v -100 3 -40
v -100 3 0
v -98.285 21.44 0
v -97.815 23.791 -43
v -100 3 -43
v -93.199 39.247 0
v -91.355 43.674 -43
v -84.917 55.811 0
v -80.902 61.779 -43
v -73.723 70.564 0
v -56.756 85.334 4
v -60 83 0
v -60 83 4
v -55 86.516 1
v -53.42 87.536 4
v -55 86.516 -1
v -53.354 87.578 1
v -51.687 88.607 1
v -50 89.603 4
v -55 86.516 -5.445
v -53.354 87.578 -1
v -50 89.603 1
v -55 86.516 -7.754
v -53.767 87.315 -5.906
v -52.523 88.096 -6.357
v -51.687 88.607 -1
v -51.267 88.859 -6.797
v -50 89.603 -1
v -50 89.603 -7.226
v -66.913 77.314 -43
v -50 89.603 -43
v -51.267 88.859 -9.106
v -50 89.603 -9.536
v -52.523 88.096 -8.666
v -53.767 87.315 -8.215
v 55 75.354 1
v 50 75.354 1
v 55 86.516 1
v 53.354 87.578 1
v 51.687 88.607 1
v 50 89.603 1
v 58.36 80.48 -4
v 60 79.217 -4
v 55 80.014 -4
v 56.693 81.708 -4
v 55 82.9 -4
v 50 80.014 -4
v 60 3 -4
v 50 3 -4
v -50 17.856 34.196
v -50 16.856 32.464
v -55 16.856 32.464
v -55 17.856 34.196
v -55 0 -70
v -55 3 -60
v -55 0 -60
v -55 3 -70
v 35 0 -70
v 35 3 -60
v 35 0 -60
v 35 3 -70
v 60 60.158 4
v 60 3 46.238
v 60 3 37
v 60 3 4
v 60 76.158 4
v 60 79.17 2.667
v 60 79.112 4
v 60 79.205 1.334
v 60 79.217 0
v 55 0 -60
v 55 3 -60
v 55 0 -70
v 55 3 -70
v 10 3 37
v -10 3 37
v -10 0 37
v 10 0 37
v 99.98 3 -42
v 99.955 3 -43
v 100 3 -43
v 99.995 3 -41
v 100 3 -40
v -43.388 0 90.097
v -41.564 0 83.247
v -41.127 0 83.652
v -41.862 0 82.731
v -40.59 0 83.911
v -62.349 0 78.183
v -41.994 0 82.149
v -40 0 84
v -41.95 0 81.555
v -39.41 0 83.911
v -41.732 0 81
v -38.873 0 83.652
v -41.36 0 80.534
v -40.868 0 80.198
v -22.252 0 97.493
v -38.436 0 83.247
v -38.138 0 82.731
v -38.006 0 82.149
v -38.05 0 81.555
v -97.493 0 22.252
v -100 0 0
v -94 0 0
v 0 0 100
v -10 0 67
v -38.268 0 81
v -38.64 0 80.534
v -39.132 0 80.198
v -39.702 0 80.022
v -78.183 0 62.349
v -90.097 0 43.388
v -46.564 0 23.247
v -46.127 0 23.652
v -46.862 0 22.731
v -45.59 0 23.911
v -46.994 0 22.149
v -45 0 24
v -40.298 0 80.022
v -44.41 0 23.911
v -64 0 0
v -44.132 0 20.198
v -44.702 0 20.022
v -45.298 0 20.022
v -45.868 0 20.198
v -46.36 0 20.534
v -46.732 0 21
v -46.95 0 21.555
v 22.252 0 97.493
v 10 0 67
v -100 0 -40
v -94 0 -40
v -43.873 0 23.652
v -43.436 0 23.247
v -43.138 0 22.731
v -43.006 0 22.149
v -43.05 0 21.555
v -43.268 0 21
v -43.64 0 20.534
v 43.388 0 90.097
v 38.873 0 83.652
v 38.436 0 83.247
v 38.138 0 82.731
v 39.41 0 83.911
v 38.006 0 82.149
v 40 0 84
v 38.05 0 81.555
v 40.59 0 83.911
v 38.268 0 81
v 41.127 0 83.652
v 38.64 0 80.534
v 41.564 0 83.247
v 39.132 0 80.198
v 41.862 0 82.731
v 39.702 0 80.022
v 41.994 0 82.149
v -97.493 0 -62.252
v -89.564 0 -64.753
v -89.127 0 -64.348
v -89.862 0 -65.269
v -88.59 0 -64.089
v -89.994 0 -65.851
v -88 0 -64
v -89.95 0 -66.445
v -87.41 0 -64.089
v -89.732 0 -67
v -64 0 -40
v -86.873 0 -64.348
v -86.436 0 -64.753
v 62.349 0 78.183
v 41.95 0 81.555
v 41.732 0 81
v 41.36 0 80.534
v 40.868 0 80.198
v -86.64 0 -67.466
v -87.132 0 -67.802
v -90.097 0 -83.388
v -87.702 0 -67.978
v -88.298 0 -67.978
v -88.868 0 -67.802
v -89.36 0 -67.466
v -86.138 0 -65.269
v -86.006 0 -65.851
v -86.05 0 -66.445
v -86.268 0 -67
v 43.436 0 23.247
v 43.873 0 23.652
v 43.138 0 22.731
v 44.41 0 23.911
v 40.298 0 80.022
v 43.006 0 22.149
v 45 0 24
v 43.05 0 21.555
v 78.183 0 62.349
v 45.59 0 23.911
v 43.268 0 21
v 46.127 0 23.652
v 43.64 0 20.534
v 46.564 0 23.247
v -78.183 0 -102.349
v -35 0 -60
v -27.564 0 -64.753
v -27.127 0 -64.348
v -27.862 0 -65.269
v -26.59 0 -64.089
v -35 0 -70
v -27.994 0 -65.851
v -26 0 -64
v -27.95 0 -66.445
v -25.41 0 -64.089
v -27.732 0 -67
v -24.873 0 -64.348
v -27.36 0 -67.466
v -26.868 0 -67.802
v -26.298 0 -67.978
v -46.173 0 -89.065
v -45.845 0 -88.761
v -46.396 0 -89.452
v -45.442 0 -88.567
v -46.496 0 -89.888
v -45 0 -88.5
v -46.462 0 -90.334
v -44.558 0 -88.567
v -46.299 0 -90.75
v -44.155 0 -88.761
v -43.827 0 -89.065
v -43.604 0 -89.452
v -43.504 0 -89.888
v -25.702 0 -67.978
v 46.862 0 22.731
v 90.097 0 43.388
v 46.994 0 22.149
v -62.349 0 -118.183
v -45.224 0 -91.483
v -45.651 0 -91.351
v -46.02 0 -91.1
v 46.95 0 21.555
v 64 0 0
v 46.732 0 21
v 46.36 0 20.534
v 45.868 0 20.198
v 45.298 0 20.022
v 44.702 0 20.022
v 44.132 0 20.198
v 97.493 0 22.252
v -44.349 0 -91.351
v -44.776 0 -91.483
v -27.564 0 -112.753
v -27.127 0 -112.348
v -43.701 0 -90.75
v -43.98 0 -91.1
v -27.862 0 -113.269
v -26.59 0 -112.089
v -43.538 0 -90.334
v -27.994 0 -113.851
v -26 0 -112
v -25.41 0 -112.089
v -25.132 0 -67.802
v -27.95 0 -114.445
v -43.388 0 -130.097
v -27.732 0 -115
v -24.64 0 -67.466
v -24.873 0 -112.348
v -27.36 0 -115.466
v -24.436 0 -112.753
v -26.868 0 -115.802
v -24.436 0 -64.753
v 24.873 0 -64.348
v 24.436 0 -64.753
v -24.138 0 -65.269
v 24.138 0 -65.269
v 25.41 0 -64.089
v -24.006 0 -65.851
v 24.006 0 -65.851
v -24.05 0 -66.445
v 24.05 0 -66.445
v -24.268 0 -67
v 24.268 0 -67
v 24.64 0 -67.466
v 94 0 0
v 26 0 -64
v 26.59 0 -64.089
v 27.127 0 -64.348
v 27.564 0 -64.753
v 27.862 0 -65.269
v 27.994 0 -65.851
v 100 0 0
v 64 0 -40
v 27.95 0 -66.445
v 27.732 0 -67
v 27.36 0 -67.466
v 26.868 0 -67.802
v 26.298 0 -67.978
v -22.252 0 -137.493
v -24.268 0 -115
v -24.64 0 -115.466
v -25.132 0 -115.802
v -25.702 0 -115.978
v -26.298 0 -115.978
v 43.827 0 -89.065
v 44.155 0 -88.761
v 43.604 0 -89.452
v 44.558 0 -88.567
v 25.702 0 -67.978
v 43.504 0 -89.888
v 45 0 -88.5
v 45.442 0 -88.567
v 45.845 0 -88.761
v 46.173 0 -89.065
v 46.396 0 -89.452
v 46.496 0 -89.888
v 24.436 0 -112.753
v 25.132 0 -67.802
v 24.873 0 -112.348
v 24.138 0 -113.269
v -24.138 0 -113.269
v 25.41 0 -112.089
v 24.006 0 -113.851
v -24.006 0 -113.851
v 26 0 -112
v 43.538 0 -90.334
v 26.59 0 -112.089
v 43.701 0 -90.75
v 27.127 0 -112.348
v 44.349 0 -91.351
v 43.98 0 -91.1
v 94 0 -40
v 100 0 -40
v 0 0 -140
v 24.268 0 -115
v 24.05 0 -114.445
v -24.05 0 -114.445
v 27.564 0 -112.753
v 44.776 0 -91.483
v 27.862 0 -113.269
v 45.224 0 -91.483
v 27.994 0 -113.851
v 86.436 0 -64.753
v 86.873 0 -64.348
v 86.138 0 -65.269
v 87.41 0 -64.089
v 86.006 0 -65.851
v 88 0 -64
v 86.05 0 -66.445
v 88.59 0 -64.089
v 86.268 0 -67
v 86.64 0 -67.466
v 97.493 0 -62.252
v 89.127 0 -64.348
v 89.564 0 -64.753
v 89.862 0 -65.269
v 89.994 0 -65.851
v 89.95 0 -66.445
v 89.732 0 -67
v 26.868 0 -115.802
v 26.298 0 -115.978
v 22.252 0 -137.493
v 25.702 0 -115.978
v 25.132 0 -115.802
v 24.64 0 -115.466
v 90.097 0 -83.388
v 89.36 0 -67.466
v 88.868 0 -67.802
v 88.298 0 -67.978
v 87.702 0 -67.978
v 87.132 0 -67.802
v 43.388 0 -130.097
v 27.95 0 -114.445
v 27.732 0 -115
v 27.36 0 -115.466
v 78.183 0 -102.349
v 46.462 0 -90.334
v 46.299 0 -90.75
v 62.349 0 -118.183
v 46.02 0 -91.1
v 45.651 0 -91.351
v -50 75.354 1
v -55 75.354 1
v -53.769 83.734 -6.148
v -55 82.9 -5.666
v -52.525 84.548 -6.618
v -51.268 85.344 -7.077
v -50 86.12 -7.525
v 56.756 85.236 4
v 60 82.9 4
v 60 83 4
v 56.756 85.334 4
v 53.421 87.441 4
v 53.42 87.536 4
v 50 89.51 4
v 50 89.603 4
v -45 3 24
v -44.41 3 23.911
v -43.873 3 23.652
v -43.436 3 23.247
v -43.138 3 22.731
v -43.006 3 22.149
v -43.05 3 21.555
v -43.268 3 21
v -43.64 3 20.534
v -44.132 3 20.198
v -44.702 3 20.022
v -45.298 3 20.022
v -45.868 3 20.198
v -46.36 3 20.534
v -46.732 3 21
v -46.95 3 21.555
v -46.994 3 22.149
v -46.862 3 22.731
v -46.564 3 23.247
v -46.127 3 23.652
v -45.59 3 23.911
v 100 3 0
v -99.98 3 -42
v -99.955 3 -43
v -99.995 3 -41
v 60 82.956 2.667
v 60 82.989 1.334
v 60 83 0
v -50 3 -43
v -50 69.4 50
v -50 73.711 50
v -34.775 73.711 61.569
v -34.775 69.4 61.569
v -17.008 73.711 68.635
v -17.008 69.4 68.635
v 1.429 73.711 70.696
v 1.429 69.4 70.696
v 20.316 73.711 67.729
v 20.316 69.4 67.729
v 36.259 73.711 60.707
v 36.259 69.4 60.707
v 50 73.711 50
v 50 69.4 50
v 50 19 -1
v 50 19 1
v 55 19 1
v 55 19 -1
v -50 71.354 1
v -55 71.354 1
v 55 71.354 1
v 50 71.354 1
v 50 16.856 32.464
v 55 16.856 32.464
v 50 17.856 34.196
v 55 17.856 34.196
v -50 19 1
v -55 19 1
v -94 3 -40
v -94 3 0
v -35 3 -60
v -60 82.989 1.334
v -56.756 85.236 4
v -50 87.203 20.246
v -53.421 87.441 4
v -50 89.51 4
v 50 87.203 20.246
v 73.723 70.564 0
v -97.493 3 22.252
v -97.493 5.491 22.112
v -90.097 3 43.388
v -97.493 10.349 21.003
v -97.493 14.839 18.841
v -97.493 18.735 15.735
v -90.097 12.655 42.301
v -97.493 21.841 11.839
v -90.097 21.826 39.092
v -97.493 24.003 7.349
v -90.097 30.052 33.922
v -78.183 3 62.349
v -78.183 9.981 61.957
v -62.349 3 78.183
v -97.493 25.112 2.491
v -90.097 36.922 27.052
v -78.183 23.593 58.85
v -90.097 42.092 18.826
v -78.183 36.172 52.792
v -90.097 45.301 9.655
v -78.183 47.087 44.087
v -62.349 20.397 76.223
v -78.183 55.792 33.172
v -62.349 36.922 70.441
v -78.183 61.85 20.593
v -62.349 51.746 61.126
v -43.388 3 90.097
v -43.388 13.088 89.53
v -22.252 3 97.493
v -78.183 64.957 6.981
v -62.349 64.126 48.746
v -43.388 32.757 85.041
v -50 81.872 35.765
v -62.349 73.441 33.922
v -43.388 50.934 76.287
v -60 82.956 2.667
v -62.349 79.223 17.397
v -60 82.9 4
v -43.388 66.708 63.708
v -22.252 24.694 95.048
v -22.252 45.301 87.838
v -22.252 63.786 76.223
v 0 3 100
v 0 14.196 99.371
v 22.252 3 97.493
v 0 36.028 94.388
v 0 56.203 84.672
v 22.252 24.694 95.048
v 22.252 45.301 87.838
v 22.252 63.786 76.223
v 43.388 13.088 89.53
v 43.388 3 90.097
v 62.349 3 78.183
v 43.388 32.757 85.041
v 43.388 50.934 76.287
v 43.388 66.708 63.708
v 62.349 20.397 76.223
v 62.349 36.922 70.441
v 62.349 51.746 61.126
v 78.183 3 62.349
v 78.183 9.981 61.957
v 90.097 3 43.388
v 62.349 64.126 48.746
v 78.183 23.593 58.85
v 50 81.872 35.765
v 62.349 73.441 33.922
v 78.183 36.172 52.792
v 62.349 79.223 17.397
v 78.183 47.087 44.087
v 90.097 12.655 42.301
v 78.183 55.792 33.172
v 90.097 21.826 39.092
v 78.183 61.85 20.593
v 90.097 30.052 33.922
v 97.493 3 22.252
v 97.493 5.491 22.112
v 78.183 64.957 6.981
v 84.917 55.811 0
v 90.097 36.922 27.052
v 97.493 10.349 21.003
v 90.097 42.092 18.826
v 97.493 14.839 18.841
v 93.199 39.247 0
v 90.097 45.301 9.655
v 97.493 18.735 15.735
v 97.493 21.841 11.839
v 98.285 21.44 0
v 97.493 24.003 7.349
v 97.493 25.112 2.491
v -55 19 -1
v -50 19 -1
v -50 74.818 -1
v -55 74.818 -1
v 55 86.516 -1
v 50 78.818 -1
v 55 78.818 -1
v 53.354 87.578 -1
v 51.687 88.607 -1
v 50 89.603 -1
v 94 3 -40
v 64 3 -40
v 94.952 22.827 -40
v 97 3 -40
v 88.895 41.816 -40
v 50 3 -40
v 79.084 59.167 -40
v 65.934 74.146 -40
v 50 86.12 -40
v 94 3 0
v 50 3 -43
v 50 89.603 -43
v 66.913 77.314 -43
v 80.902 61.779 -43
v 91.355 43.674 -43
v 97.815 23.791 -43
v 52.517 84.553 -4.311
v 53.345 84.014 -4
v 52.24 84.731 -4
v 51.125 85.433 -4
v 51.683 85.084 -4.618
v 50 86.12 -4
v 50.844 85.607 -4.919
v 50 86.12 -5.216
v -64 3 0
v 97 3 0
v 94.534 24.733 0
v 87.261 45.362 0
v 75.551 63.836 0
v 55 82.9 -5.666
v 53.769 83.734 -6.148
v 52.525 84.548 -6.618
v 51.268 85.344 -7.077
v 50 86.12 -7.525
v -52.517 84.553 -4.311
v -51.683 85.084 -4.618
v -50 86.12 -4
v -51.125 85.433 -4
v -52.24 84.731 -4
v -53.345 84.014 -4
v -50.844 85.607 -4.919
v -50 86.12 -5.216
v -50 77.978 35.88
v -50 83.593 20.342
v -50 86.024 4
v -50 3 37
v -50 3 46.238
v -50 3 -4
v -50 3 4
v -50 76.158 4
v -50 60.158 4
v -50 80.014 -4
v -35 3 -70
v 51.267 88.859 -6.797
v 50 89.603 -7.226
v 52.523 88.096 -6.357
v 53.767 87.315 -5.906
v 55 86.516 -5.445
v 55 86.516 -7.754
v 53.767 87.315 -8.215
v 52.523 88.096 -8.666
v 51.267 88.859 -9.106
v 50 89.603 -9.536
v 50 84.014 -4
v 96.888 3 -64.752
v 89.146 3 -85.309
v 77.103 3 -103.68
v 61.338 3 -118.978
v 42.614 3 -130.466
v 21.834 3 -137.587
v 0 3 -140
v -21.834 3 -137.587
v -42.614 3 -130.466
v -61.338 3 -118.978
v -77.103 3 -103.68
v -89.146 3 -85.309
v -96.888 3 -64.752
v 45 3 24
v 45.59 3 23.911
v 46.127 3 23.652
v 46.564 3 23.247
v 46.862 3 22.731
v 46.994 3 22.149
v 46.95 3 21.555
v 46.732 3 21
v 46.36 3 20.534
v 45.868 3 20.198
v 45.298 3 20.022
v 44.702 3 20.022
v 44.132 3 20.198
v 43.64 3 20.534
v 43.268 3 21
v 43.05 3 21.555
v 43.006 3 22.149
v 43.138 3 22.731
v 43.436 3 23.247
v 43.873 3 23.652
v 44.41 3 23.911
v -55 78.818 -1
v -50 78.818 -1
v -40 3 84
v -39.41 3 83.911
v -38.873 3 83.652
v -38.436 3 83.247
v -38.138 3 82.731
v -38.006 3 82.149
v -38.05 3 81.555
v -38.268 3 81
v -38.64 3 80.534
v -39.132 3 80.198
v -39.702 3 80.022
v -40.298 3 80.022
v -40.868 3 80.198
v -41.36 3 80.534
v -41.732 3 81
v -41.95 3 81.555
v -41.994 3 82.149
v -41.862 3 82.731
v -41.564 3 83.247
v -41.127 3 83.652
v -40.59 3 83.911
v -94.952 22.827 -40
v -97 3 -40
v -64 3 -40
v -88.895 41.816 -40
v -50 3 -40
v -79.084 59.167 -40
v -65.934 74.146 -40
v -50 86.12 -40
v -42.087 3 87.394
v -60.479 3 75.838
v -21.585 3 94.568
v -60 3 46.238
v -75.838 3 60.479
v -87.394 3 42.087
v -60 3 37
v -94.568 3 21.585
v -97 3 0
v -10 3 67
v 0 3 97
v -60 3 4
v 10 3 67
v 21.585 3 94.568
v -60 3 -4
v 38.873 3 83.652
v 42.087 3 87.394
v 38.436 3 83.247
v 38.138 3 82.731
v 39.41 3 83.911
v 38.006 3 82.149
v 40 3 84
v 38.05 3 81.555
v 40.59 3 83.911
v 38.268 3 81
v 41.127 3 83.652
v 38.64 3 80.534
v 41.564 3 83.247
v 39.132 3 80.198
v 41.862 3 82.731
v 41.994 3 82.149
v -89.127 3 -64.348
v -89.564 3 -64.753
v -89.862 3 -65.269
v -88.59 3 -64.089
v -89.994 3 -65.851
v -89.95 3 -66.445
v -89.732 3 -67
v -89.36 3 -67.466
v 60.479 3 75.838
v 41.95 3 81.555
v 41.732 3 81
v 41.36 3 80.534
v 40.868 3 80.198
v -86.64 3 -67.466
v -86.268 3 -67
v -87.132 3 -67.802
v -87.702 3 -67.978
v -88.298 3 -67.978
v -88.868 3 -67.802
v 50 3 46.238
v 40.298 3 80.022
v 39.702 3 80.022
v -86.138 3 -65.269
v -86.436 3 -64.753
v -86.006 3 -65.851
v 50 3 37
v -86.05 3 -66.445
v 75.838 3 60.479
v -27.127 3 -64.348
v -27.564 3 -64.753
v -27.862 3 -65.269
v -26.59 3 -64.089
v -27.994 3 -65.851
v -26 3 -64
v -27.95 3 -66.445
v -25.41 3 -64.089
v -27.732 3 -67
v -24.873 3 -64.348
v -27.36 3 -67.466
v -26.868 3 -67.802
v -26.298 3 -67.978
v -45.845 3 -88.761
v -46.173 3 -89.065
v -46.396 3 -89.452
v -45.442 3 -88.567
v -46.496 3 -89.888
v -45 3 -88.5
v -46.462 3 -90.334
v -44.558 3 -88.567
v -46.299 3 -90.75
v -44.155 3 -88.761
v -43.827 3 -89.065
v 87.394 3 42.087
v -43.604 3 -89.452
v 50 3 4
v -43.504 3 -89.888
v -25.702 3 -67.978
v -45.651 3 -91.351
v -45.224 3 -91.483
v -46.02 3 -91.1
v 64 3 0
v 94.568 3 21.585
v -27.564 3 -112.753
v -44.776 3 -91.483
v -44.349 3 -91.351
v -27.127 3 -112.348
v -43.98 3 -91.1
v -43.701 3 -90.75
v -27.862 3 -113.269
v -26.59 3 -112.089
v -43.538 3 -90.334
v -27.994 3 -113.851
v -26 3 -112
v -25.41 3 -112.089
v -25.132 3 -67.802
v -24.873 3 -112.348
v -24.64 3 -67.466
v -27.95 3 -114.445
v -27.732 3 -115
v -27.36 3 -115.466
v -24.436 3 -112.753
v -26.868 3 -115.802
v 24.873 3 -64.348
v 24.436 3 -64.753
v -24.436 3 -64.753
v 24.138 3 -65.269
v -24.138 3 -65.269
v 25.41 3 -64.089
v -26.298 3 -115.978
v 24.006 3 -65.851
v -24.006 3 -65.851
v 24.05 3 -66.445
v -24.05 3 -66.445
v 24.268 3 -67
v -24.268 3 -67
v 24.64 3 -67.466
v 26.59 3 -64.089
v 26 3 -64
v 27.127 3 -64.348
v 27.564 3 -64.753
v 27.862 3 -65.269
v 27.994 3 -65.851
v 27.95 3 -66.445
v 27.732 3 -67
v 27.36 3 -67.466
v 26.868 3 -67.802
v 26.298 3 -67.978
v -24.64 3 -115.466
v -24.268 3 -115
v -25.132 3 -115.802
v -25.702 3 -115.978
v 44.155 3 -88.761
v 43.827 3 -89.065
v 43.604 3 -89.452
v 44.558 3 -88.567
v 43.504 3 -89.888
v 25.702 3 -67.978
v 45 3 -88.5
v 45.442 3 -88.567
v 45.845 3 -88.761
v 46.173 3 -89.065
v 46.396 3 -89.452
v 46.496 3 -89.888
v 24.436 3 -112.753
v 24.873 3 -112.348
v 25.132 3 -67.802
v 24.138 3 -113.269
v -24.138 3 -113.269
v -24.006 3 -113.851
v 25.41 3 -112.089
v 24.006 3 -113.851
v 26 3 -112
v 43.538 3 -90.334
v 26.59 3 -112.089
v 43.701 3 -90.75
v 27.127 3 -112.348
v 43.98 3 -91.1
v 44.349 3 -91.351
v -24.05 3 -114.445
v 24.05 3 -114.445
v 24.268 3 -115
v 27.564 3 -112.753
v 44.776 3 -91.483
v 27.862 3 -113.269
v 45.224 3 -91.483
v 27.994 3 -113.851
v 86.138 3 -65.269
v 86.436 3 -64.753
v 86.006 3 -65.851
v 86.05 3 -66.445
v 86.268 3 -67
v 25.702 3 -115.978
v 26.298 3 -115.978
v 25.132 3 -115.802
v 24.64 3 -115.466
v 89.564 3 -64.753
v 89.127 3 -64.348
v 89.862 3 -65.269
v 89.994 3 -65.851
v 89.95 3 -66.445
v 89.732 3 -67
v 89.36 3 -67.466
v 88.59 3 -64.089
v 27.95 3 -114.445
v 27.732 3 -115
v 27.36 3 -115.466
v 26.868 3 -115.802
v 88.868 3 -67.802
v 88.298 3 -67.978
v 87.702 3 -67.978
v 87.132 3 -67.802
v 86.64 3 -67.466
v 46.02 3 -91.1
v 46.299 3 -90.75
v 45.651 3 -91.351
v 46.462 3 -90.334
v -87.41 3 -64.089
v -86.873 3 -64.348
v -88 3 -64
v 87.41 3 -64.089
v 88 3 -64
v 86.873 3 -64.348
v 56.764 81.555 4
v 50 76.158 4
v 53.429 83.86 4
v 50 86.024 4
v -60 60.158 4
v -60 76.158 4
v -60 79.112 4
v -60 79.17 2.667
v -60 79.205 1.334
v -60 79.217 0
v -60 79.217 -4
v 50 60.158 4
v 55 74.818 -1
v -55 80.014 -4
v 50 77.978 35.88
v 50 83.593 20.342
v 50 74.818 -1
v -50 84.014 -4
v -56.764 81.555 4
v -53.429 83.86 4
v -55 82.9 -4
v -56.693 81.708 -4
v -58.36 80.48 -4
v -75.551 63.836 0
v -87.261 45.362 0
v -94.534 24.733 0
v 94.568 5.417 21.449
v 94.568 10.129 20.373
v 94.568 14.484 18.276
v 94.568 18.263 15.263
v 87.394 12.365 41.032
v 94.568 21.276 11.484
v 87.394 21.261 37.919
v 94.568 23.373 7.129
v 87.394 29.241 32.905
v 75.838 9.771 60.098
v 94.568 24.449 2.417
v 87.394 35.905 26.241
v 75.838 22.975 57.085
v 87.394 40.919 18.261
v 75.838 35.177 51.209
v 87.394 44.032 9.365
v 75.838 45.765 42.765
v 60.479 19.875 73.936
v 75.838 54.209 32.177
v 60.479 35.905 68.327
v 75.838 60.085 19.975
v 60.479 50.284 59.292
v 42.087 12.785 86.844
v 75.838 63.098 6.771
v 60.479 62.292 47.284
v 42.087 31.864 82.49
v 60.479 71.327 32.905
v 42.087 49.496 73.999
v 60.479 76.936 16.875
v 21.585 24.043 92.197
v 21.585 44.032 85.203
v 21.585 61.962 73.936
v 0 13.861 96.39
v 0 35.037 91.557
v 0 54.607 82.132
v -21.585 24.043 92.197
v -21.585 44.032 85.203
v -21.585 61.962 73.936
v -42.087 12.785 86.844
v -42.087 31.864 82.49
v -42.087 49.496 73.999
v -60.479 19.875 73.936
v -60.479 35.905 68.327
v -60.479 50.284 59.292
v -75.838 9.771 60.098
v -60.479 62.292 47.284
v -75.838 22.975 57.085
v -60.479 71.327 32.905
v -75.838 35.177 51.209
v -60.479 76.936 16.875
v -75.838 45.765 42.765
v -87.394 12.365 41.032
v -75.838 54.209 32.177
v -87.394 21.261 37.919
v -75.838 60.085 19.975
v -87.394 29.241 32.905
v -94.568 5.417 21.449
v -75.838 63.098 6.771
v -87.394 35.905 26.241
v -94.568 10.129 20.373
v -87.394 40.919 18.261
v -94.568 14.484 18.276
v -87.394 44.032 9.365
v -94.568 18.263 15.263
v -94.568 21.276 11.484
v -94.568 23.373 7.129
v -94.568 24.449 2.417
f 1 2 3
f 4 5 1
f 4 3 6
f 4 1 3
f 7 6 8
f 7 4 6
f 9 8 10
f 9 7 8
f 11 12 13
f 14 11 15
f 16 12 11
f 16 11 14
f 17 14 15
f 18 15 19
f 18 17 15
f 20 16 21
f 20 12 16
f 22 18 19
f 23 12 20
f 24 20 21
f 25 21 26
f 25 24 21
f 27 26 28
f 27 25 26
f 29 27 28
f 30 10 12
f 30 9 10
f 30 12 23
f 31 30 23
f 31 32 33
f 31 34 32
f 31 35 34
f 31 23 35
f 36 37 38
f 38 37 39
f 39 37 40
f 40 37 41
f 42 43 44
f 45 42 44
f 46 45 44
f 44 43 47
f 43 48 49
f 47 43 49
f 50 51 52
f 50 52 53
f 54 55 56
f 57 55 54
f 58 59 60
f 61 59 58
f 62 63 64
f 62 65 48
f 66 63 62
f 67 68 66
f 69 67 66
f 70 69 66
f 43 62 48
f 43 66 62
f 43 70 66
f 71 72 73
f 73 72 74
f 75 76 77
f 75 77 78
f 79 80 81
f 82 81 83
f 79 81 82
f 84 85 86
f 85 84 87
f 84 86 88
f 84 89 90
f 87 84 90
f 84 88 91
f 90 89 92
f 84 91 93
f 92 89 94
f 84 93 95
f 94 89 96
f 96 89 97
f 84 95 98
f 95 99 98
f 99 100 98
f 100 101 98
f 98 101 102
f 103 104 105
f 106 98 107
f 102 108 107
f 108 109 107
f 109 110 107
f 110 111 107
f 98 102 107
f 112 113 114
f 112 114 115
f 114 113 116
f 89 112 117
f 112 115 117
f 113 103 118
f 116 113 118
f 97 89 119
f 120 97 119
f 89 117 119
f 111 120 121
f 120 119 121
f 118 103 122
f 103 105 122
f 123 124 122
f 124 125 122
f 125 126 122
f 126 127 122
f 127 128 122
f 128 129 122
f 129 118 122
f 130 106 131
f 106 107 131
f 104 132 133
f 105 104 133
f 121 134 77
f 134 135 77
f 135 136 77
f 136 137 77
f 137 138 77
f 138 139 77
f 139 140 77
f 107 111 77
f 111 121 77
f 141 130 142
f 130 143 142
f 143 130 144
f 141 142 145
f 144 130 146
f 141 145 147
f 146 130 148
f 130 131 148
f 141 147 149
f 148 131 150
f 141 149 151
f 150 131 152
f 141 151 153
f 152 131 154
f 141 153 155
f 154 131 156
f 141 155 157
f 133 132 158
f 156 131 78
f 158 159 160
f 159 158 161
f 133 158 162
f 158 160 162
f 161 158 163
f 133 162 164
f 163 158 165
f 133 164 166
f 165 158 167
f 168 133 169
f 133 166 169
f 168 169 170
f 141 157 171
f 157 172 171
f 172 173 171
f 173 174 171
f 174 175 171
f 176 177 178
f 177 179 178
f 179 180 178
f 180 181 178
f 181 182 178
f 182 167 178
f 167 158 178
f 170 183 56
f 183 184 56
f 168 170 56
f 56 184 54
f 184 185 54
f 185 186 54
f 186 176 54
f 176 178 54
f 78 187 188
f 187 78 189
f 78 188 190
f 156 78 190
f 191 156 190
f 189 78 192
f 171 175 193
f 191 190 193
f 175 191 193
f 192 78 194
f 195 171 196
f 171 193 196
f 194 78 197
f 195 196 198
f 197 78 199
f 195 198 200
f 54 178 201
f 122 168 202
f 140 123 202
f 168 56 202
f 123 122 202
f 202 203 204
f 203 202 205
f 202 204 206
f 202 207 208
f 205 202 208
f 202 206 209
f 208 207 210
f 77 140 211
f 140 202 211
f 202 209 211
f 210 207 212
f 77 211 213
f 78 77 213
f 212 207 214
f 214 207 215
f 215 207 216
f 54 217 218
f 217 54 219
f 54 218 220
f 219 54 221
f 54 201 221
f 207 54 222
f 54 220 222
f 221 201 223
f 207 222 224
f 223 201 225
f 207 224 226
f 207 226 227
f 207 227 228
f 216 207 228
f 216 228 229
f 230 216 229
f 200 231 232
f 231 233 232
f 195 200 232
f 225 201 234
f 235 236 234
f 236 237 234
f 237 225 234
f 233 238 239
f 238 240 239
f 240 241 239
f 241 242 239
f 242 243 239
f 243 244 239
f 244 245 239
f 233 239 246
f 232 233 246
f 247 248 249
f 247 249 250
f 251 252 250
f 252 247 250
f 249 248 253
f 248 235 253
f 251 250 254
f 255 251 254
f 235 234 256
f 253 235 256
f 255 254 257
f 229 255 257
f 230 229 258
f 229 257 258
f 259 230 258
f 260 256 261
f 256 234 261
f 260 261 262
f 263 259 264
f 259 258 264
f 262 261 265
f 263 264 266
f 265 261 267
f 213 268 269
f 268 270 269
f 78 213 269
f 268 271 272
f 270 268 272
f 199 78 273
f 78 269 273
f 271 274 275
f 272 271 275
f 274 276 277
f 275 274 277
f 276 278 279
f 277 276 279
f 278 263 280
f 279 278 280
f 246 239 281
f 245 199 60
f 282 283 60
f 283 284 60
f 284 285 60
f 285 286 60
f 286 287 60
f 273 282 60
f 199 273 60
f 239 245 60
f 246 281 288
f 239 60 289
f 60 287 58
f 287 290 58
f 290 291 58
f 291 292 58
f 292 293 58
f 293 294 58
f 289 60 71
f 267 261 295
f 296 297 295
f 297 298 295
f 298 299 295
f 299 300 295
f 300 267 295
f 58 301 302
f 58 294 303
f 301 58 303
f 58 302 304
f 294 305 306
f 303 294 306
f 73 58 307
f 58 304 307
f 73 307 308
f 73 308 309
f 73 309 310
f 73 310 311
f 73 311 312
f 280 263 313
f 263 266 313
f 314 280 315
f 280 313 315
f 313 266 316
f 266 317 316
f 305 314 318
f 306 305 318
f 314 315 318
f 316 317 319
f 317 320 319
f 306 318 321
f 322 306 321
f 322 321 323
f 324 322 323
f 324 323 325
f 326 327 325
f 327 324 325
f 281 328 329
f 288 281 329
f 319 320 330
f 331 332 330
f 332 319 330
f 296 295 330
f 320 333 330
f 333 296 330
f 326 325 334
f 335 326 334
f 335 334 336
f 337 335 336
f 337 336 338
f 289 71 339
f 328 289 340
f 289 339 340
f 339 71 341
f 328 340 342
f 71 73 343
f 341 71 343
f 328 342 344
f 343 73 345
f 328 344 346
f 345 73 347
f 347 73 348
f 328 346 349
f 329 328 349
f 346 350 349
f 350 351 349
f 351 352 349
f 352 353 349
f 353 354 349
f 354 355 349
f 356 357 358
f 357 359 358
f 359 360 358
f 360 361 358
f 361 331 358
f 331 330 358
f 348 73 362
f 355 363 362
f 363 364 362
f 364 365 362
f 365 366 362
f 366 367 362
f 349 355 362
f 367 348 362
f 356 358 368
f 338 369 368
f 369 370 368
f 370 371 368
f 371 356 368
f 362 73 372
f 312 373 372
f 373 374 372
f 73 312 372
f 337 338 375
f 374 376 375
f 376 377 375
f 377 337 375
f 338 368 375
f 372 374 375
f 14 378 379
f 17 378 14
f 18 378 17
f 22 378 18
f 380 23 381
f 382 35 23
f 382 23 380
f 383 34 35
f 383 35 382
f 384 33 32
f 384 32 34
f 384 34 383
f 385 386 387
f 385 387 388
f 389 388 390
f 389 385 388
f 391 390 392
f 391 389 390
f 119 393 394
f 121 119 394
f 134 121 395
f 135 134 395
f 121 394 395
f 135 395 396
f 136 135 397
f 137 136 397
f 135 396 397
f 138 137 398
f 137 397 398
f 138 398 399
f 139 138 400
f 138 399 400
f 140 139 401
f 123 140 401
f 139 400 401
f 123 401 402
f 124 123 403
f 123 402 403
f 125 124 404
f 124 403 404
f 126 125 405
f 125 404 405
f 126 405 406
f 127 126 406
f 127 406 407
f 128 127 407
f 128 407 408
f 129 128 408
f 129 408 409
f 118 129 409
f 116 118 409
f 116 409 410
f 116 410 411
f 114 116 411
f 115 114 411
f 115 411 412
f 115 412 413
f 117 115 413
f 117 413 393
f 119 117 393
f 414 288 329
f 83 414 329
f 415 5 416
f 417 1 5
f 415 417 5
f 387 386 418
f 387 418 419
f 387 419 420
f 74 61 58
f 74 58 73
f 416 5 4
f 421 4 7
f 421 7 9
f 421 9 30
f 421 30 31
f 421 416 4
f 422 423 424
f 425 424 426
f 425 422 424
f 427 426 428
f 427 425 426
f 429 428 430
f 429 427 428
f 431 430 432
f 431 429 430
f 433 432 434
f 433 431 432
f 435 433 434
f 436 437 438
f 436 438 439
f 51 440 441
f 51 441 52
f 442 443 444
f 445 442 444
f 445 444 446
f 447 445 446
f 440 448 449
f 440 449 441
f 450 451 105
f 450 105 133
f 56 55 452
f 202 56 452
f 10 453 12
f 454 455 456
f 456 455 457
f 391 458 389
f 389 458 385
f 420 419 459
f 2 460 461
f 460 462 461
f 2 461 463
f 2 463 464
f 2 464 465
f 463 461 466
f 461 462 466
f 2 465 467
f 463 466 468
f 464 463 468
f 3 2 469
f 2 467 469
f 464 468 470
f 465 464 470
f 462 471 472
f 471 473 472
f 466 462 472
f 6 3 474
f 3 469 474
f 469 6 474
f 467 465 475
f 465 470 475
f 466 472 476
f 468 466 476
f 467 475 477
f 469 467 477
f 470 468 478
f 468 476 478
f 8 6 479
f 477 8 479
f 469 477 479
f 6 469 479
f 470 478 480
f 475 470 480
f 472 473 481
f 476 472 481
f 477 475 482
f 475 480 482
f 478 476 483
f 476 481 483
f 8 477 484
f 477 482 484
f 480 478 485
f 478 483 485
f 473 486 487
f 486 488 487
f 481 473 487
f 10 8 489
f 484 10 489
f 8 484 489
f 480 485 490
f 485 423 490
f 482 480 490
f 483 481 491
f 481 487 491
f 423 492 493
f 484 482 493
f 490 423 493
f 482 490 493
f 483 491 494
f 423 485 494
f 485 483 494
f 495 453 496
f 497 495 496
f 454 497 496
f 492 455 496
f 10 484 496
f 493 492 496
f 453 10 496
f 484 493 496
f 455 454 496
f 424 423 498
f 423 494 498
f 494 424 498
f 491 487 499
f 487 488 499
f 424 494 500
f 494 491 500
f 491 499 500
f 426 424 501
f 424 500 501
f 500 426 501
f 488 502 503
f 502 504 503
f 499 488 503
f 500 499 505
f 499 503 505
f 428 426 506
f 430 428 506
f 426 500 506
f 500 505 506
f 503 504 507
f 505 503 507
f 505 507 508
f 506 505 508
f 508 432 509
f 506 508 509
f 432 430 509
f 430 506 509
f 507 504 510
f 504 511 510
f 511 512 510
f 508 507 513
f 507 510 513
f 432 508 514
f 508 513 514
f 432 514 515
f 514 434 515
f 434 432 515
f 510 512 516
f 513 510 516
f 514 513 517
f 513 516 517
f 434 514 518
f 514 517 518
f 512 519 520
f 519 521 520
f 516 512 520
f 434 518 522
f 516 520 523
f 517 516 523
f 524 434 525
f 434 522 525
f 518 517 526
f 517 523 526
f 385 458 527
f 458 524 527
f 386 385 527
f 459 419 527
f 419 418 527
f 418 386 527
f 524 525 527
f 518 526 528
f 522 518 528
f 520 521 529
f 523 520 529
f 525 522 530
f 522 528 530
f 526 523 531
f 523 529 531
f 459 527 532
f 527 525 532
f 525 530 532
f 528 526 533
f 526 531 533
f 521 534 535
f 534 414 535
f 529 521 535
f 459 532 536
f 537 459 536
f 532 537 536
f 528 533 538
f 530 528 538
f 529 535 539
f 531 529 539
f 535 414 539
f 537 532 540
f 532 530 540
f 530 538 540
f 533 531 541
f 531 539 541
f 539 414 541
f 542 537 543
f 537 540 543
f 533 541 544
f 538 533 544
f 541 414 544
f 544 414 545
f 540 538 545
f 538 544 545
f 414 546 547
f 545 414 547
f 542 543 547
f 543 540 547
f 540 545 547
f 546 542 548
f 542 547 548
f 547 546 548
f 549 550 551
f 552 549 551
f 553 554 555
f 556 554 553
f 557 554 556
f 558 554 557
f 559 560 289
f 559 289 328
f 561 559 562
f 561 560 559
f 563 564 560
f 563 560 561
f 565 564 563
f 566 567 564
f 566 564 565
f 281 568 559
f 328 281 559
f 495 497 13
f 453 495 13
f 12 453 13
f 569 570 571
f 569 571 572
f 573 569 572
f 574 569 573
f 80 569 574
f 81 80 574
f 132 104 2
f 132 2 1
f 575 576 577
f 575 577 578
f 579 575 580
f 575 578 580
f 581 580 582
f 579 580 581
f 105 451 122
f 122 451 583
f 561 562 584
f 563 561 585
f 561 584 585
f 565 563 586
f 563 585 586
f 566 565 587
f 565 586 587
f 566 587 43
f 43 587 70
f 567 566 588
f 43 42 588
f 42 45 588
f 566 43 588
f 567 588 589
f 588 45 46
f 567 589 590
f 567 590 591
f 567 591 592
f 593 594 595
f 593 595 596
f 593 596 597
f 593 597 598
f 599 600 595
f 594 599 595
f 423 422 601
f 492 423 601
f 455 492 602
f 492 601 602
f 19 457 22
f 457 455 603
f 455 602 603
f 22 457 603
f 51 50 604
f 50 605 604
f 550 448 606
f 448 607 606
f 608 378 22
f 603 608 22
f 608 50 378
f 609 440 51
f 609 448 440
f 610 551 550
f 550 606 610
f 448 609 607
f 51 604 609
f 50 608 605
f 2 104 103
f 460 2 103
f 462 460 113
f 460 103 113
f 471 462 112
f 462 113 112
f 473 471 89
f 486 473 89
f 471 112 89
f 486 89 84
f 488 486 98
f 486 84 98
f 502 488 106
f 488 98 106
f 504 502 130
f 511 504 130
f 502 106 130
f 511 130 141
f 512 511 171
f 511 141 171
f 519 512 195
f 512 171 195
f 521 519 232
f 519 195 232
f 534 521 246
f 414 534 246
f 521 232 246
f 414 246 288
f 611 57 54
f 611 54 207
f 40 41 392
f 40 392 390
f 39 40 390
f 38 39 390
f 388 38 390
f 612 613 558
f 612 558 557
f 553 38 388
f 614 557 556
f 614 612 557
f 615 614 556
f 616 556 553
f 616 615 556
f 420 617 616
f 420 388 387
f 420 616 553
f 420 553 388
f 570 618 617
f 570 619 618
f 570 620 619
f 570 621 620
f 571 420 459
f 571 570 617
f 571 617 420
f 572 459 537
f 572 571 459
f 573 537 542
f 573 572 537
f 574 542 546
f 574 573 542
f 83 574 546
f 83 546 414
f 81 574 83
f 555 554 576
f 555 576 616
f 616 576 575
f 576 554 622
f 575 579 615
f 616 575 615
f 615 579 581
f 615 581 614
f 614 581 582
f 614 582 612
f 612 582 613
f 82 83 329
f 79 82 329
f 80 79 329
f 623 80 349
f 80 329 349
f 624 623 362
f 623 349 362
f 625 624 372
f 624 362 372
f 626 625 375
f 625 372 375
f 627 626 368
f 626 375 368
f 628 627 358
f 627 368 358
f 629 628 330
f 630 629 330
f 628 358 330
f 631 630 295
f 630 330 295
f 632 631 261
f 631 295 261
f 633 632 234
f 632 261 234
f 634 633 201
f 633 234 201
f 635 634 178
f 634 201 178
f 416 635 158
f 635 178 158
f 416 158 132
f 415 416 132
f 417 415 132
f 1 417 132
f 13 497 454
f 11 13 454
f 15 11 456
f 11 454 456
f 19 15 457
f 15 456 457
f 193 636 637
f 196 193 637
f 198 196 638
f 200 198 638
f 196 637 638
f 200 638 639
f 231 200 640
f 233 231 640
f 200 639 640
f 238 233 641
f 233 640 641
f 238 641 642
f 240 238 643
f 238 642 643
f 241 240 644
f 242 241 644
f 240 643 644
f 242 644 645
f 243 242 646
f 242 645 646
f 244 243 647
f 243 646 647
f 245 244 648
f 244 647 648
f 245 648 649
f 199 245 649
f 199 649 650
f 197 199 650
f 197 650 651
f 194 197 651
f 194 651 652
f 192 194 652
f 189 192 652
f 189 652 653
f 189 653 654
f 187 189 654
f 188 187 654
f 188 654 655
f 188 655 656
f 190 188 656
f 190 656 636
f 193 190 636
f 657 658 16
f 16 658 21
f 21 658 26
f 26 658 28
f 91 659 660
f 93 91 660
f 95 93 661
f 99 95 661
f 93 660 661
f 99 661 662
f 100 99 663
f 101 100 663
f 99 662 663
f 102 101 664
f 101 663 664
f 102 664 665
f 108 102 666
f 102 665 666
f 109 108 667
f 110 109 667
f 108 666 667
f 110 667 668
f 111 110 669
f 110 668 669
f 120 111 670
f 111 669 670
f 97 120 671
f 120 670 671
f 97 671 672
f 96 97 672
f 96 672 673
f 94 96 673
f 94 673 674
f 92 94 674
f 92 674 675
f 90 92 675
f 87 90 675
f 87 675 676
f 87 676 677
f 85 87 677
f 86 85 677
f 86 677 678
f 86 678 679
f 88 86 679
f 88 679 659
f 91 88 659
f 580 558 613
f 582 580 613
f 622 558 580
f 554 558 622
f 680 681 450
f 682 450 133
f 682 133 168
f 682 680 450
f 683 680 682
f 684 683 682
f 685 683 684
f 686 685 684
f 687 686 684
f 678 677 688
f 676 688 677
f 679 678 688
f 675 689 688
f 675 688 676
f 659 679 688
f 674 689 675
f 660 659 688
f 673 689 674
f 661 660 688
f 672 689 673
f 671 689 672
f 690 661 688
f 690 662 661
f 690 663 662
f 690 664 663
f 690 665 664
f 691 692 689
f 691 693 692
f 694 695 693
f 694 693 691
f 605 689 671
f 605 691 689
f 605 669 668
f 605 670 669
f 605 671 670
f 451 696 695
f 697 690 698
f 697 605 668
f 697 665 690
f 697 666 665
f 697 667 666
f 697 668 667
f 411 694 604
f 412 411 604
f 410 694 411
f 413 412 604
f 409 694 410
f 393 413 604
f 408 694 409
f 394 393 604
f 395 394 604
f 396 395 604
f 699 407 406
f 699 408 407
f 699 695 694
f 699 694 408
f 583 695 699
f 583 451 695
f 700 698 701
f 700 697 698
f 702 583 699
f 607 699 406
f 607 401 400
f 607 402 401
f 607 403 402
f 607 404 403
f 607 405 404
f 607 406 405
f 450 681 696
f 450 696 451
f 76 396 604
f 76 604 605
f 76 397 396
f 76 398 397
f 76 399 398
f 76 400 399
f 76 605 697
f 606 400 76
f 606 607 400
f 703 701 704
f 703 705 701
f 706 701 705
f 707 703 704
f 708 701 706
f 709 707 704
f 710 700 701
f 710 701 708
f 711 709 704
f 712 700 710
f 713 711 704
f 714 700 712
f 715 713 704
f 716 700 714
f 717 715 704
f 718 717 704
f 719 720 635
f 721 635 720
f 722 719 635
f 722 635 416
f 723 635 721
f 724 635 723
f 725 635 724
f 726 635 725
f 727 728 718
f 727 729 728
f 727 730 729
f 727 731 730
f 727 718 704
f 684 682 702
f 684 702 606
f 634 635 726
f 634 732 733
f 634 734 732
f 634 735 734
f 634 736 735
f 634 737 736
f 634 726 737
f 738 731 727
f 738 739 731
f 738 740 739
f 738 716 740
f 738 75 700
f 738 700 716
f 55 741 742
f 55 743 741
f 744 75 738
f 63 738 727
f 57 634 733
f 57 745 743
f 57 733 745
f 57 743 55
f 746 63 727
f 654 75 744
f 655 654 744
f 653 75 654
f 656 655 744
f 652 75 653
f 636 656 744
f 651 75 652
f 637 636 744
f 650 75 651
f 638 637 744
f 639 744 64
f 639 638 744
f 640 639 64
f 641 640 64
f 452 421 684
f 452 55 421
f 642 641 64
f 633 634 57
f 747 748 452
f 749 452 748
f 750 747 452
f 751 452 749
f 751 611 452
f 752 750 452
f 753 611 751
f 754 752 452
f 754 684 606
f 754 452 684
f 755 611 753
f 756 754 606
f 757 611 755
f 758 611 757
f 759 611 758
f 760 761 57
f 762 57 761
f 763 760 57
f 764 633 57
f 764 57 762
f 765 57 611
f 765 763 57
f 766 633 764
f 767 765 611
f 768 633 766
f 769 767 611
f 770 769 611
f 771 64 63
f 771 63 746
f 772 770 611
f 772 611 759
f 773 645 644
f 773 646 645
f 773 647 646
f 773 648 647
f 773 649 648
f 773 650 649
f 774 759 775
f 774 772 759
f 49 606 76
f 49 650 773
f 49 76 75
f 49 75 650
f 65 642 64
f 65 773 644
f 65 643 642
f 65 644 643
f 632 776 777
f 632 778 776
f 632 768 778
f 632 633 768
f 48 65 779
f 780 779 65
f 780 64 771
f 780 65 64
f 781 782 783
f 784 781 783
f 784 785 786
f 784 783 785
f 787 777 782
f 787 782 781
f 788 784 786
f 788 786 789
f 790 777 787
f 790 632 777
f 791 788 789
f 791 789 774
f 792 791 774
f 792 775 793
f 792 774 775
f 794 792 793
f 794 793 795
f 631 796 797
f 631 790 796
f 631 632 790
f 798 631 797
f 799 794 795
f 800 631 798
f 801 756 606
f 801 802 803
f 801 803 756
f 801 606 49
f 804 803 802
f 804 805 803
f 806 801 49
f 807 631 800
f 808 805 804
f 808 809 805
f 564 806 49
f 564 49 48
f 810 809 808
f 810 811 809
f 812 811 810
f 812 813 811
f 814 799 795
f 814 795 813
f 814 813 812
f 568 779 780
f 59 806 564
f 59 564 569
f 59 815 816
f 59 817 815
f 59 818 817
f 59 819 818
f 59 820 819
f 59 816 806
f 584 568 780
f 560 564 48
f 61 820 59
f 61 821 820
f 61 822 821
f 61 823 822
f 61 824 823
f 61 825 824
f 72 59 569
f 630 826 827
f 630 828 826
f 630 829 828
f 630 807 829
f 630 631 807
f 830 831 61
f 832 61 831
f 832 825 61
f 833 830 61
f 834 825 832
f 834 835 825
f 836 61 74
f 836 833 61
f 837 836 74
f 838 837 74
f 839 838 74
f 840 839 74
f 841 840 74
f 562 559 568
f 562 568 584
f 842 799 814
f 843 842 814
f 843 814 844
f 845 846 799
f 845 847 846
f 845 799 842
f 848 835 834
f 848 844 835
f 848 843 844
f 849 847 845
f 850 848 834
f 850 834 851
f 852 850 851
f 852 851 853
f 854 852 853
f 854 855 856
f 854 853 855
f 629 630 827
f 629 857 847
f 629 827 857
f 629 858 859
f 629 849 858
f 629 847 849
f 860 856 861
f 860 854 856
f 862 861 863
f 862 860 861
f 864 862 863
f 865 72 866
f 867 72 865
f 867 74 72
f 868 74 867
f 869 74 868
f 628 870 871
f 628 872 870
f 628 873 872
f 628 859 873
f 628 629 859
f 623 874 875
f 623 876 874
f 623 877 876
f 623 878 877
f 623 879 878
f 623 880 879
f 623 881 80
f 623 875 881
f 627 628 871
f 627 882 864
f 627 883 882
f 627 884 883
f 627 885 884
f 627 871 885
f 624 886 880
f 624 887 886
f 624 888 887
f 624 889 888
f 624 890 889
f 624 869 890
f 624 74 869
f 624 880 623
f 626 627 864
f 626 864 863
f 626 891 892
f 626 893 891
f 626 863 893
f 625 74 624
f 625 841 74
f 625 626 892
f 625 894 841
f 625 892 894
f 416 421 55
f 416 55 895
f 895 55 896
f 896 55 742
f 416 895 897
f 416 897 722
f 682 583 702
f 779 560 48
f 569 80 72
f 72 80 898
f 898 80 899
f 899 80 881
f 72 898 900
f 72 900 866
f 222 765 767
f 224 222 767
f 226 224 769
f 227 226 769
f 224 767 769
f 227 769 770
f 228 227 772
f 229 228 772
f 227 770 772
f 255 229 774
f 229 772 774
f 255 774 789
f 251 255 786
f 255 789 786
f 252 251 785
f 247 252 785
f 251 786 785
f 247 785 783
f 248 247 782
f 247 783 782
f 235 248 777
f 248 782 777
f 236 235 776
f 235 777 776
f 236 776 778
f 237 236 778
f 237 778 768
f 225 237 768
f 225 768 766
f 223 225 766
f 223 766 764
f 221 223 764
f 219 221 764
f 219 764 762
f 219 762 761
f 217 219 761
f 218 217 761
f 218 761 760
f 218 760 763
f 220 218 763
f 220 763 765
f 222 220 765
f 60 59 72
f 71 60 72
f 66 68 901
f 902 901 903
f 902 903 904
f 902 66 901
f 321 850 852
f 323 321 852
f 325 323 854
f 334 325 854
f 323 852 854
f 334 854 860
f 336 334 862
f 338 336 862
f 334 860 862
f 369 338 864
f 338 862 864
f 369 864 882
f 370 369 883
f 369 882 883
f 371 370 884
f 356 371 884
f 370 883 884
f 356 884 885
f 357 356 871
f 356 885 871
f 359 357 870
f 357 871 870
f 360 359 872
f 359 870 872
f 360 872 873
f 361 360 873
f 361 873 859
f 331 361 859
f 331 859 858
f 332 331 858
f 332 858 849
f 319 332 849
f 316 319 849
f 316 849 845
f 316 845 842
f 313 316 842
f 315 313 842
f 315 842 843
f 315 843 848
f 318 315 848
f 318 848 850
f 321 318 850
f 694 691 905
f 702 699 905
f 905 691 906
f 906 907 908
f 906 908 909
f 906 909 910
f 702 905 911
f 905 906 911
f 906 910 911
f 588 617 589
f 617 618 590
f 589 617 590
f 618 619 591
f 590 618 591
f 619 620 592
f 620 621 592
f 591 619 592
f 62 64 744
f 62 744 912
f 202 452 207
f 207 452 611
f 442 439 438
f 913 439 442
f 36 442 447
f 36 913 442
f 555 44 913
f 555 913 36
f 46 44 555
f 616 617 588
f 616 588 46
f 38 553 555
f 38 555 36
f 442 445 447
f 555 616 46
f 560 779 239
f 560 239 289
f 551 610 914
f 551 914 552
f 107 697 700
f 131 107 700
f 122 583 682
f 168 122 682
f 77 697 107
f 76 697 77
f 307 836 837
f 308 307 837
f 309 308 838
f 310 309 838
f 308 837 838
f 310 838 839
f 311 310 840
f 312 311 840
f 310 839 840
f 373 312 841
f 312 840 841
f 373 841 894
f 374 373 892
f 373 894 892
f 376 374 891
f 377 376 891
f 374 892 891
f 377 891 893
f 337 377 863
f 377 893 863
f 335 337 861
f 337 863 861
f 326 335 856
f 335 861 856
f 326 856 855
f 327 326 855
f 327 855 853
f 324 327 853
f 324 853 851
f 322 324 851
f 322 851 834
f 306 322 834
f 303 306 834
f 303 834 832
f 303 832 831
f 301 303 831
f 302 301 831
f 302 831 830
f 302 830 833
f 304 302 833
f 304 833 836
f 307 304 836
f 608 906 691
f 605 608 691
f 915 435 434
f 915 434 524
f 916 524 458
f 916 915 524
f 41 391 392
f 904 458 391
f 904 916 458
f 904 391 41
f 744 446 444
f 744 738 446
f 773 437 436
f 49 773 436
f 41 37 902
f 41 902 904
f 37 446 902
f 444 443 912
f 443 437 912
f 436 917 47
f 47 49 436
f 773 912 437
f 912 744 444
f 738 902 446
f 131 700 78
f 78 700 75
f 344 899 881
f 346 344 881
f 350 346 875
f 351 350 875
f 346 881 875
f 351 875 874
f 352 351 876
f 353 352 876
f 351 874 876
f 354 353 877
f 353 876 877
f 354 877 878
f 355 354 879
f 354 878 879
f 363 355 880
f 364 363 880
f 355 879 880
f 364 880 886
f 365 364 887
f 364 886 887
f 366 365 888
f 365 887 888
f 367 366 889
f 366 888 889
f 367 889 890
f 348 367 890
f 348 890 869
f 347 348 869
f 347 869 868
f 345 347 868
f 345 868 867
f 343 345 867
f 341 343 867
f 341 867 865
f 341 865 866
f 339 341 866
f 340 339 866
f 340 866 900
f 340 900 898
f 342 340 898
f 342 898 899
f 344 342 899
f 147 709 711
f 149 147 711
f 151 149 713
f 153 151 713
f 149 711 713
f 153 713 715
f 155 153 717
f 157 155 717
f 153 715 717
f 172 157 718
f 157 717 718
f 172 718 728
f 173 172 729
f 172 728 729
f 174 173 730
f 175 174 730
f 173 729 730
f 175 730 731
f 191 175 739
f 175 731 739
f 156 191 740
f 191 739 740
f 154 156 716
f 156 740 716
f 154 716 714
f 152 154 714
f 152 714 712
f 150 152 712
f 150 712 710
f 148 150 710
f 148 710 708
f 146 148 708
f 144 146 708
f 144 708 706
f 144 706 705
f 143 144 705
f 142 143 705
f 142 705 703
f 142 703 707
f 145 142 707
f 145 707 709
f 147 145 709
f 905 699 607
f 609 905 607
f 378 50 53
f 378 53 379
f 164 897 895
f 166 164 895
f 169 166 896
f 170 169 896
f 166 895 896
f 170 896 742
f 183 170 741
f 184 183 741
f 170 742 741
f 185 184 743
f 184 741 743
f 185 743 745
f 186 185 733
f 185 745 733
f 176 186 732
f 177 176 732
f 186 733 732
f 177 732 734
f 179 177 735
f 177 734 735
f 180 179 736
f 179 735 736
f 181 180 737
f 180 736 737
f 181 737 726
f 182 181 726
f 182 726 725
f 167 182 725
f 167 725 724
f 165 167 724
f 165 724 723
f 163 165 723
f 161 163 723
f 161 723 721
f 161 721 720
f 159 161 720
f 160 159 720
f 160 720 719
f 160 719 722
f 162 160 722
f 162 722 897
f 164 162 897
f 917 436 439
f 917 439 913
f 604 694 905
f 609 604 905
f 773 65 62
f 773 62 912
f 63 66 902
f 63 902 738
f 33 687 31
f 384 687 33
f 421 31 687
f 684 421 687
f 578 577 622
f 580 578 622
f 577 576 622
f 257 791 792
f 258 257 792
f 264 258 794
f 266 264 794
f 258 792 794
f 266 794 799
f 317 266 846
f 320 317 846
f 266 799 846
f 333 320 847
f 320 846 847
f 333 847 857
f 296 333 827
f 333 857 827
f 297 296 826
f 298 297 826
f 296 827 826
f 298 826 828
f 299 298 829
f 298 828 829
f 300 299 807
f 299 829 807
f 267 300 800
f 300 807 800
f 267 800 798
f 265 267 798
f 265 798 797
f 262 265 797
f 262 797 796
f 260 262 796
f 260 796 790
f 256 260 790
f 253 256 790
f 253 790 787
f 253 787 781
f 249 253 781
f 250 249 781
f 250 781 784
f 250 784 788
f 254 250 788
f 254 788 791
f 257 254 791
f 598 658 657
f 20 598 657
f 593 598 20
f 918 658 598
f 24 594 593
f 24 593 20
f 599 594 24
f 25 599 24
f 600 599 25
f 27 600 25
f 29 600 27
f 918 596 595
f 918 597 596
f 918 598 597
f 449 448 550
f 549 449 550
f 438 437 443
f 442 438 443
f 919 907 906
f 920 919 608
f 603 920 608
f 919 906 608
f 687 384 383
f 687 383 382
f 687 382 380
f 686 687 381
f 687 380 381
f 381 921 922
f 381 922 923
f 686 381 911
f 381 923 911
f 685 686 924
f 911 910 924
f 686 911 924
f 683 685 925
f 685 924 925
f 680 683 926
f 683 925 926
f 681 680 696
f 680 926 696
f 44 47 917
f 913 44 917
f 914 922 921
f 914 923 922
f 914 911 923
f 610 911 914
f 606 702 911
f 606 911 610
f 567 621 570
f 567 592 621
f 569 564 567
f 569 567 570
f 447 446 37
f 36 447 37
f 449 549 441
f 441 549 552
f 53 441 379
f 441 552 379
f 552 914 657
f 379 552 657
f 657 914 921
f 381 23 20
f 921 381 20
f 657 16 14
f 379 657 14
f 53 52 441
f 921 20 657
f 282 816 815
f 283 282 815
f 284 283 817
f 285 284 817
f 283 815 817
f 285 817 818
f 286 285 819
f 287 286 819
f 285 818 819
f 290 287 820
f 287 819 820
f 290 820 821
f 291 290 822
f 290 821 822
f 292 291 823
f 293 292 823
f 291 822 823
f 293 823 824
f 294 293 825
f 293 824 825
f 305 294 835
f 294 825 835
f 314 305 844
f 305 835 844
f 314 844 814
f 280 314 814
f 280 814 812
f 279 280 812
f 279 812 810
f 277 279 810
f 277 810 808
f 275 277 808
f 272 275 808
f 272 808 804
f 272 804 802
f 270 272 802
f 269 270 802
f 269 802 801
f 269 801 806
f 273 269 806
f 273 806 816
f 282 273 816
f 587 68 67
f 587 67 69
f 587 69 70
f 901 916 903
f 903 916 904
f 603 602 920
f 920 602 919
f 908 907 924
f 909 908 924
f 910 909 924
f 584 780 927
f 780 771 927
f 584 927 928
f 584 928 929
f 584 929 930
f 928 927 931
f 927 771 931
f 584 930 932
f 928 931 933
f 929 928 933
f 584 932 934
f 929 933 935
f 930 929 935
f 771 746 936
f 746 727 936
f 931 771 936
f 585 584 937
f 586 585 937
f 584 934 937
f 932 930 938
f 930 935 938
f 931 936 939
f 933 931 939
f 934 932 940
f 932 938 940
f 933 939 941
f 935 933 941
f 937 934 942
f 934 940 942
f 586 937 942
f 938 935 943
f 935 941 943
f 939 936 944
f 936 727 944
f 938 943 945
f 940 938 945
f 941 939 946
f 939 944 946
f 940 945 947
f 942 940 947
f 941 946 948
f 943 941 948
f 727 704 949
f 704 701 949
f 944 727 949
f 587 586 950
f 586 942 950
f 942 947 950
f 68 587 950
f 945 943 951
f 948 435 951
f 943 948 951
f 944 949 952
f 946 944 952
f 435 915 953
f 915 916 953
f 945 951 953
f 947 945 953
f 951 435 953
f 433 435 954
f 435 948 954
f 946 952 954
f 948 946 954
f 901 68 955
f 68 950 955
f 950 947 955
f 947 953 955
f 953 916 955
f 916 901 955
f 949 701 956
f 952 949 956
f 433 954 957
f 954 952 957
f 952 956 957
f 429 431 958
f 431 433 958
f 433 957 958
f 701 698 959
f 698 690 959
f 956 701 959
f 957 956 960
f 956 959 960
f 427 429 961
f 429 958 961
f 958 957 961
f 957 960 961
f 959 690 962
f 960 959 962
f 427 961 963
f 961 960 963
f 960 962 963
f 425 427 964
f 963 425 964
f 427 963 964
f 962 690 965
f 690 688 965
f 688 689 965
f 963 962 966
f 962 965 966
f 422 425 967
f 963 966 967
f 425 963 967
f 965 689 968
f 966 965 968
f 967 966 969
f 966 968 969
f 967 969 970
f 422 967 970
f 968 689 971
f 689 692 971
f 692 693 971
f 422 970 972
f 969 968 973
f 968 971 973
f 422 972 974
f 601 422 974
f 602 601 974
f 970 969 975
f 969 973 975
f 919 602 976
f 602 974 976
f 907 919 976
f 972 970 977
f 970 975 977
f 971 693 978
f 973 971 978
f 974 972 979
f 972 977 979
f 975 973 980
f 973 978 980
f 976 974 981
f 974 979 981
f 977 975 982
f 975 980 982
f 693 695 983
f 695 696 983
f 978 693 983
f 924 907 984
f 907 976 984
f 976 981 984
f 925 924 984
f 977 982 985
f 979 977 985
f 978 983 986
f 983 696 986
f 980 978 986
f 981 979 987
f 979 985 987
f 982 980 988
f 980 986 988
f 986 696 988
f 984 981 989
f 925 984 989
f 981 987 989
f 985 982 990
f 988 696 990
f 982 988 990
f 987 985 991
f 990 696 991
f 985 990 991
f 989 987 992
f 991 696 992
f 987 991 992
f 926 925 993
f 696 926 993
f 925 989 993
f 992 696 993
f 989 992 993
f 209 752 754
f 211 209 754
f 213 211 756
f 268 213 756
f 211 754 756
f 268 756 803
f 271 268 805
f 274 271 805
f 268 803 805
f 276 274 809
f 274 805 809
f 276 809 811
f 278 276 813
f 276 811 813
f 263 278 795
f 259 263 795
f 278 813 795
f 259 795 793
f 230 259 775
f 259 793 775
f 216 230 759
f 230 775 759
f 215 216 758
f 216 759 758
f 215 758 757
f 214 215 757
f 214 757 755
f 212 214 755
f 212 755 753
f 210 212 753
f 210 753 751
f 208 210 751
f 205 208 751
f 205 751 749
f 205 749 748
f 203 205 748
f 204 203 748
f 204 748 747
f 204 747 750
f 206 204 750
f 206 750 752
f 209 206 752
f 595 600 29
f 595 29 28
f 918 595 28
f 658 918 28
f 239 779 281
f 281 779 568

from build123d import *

# Parameters (mm, degrees)
SKETCH_1_R                  = 100
SKETCH_1_W                  = 200
SKETCH_1_H                  = 40
EXTRUDE_524_DEPTH           = 3
SKETCH_3_W                  = 30
SKETCH_3_H                  = 40
SKETCH_3_W_2                = 20
SKETCH_3_H_2                = 10
SKETCH_3_H_3                = 30
CUT_EXTRUDE_1393_DEPTH      = 3
SKETCH_2_R                  = 2
SKETCH_2_R_2                = 1.5
CUT_EXTRUDE_2567_DEPTH      = 173.072659072
REVOLVE_3158_ANGLE          = 90
EXTRUDE_3359_DEPTH          = 40
SKETCH_8_W                  = 10
SKETCH_8_H                  = 8
EXTRUDE_L_DEPTH             = 100
EXTRUDE_L_32_DEPTH          = 10
SKETCH_16_W                 = 2
SKETCH_16_H                 = 84
CUT_EXTRUDE_L_DEPTH         = 5
SKETCH_23_W                 = 200
SKETCH_23_H                 = 3
EXTRUDE_5603_DEPTH          = 100
CUT_EXTRUDE_5983_DEPTH      = 100
CUT_EXTRUDE_5983_DEPTH_BACK = 100
CUT_EXTRUDE_6828_DEPTH      = 100


with BuildPart() as part:
    # 草图1 → Extrude 524 (new body)
    with BuildSketch(Plane(origin=(0, 0, 0), x_dir=(1, 0, 0), z_dir=(0, 1, 0))):
        Circle(SKETCH_1_R)
        with Locations((0, 40)):
            Circle(SKETCH_1_R)
        with Locations((0, 20)):
            Rectangle(SKETCH_1_W, SKETCH_1_H)
    extrude(amount=EXTRUDE_524_DEPTH)

    # 草图3 → Cut-Extrude 1393 (cut)
    with BuildSketch(Plane(origin=(0, 3, 0), x_dir=(1, 0, 0), z_dir=(0, 1, 0))):
        with Locations((-79, 20)):
            Rectangle(SKETCH_3_W, SKETCH_3_H)
        with Locations((79, 20)):
            Rectangle(SKETCH_3_W, SKETCH_3_H)
        with Locations((45, 65)):
            Rectangle(SKETCH_3_W_2, SKETCH_3_H_2)
        with Locations((0, -52)):
            Rectangle(SKETCH_3_W_2, SKETCH_3_H_3)
        with Locations((-45, 65)):
            Rectangle(SKETCH_3_W_2, SKETCH_3_H_2)
    extrude(amount=-CUT_EXTRUDE_1393_DEPTH, mode=Mode.SUBTRACT)

    # 草图2 → Cut-Extrude 2567 (cut, through all)
    with BuildSketch(Plane(origin=(0, 3, 0), x_dir=(1, 0, 0), z_dir=(0, 1, 0))):
        with Locations((-45, -22)):
            Circle(SKETCH_2_R)
        with Locations((-40, -82)):
            Circle(SKETCH_2_R)
        with Locations((-88, 66)):
            Circle(SKETCH_2_R)
        with Locations((-26, 66)):
            Circle(SKETCH_2_R)
        with Locations((-26, 114)):
            Circle(SKETCH_2_R)
        with Locations((40, -82)):
            Circle(SKETCH_2_R)
        with Locations((45, -22)):
            Circle(SKETCH_2_R)
        with Locations((26, 114)):
            Circle(SKETCH_2_R)
        with Locations((26, 66)):
            Circle(SKETCH_2_R)
        with Locations((88, 66)):
            Circle(SKETCH_2_R)
        with Locations((-45, 90)):
            Circle(SKETCH_2_R_2)
        with Locations((45, 90)):
            Circle(SKETCH_2_R_2)
    extrude(amount=-CUT_EXTRUDE_2567_DEPTH, mode=Mode.SUBTRACT)

    # 草图18 → Revolve 3158 (revolve)
    with BuildSketch(Plane(origin=(0, 3, 0), x_dir=(1, 0, 0), z_dir=(0, 1, 0))):
        with BuildLine():
            Line((-97, 0), (-100, 0))
            ThreePointArc((-100, 0), (0, -100), (100, 0))
            Line((100, 0), (97, 0))
            ThreePointArc((97, 0), (0, -97), (-97, 0))
        make_face()
    revolve(axis=Axis((-100, 3, 0), (-1, 0, 0)), revolution_arc=REVOLVE_3158_ANGLE)

    # 草图19 → Extrude 3359 (add)
    with BuildSketch(Plane(origin=(0, 0, 0), x_dir=(-1, 0, 0), z_dir=(0, 0, -1))):
        with BuildLine():
            Line((97, 3), (100, 3))
            ThreePointArc((100, 3), (0, 103), (-100, 3))
            Line((-100, 3), (-97, 3))
            ThreePointArc((-97, 3), (0, 100), (97, 3))
        make_face()
    extrude(amount=EXTRUDE_3359_DEPTH)

    # 草图8 → 安装架-L-树莓派 (add)
    with BuildSketch(Plane(origin=(0, 3, 0), x_dir=(1, 0, 0), z_dir=(0, 1, 0))):
        with Locations((-55, 0)):
            Rectangle(SKETCH_8_W, SKETCH_8_H)
    extrude_l = extrude(amount=EXTRUDE_L_DEPTH)

    # 草图11 → 安装架-L-32 (add)
    with BuildSketch(Plane.ZY.offset(60)):
        Polygon((37, 3), (4, 60.15767665), (3.758069686, 76.576712245), (46.237604307, 3), align=None)
    extrude_l_32 = extrude(amount=-EXTRUDE_L_32_DEPTH)

    # 草图16 → 安装架-L-凹槽 (cut)
    with BuildSketch(Plane(origin=(-50, 0, 0), x_dir=(0, 0, -1), z_dir=(1, 0, 0))):
        Polygon((-32.464101615, 16.856406461), (-34.196152423, 17.856406461), (15.803847577, 104.458946839), (17.535898385, 103.458946839), align=None)
        with Locations((0, 61)):
            Rectangle(SKETCH_16_W, SKETCH_16_H)
    cut_extrude_l = extrude(amount=-CUT_EXTRUDE_L_DEPTH, mode=Mode.SUBTRACT)

    # 安装架-R: 安装架-L-树莓派, 安装架-L-32, 安装架-L-凹槽 across plane
    add(extrude_l.mirror(Plane(origin=(0, 0, 0), x_dir=(0, 0, 1), z_dir=(1, 0, 0))))
    add(extrude_l_32.mirror(Plane(origin=(0, 0, 0), x_dir=(0, 0, 1), z_dir=(1, 0, 0))))
    add(cut_extrude_l.mirror(Plane(origin=(0, 0, 0), x_dir=(0, 0, 1), z_dir=(1, 0, 0))), mode=Mode.SUBTRACT)

    # 草图23 → Extrude 5603 (add)
    with BuildSketch(Plane(origin=(0, 3, 0), x_dir=(1, 0, 0), z_dir=(0, 1, 0))):
        with Locations((0, 41.5)):
            Rectangle(SKETCH_23_W, SKETCH_23_H)
    extrude(amount=EXTRUDE_5603_DEPTH)

    # 草图24 → Cut-Extrude 5983 (cut, two sides: drawn at the far end of the back side and taken through both)
    with BuildSketch(Plane.XY.offset(-40).offset(-CUT_EXTRUDE_5983_DEPTH_BACK)):
        with BuildLine():
            Line((-150, 3), (-100, 3))
            ThreePointArc((-100, 3), (0, 103), (100, 3))
            Line((100, 3), (150, 3))
            ThreePointArc((150, 3), (0, 153), (-150, 3))
        make_face()
    extrude(amount=CUT_EXTRUDE_5983_DEPTH + CUT_EXTRUDE_5983_DEPTH_BACK, mode=Mode.SUBTRACT)

    # 草图21 → Cut-Extrude 6828 (cut)
    with BuildSketch(Plane(origin=(0, 3, 0), x_dir=(1, 0, 0), z_dir=(0, 1, 0))):
        with BuildLine():
            Line((50, -50), (50, 50))
            Line((50, 50), (-50, 50))
            Line((-50, 50), (-50, -50))
            ThreePointArc((-50, -50), (0, -70.710678119), (50, -50))
        make_face()
    extrude(amount=CUT_EXTRUDE_6828_DEPTH, mode=Mode.SUBTRACT)


solid = part.part
